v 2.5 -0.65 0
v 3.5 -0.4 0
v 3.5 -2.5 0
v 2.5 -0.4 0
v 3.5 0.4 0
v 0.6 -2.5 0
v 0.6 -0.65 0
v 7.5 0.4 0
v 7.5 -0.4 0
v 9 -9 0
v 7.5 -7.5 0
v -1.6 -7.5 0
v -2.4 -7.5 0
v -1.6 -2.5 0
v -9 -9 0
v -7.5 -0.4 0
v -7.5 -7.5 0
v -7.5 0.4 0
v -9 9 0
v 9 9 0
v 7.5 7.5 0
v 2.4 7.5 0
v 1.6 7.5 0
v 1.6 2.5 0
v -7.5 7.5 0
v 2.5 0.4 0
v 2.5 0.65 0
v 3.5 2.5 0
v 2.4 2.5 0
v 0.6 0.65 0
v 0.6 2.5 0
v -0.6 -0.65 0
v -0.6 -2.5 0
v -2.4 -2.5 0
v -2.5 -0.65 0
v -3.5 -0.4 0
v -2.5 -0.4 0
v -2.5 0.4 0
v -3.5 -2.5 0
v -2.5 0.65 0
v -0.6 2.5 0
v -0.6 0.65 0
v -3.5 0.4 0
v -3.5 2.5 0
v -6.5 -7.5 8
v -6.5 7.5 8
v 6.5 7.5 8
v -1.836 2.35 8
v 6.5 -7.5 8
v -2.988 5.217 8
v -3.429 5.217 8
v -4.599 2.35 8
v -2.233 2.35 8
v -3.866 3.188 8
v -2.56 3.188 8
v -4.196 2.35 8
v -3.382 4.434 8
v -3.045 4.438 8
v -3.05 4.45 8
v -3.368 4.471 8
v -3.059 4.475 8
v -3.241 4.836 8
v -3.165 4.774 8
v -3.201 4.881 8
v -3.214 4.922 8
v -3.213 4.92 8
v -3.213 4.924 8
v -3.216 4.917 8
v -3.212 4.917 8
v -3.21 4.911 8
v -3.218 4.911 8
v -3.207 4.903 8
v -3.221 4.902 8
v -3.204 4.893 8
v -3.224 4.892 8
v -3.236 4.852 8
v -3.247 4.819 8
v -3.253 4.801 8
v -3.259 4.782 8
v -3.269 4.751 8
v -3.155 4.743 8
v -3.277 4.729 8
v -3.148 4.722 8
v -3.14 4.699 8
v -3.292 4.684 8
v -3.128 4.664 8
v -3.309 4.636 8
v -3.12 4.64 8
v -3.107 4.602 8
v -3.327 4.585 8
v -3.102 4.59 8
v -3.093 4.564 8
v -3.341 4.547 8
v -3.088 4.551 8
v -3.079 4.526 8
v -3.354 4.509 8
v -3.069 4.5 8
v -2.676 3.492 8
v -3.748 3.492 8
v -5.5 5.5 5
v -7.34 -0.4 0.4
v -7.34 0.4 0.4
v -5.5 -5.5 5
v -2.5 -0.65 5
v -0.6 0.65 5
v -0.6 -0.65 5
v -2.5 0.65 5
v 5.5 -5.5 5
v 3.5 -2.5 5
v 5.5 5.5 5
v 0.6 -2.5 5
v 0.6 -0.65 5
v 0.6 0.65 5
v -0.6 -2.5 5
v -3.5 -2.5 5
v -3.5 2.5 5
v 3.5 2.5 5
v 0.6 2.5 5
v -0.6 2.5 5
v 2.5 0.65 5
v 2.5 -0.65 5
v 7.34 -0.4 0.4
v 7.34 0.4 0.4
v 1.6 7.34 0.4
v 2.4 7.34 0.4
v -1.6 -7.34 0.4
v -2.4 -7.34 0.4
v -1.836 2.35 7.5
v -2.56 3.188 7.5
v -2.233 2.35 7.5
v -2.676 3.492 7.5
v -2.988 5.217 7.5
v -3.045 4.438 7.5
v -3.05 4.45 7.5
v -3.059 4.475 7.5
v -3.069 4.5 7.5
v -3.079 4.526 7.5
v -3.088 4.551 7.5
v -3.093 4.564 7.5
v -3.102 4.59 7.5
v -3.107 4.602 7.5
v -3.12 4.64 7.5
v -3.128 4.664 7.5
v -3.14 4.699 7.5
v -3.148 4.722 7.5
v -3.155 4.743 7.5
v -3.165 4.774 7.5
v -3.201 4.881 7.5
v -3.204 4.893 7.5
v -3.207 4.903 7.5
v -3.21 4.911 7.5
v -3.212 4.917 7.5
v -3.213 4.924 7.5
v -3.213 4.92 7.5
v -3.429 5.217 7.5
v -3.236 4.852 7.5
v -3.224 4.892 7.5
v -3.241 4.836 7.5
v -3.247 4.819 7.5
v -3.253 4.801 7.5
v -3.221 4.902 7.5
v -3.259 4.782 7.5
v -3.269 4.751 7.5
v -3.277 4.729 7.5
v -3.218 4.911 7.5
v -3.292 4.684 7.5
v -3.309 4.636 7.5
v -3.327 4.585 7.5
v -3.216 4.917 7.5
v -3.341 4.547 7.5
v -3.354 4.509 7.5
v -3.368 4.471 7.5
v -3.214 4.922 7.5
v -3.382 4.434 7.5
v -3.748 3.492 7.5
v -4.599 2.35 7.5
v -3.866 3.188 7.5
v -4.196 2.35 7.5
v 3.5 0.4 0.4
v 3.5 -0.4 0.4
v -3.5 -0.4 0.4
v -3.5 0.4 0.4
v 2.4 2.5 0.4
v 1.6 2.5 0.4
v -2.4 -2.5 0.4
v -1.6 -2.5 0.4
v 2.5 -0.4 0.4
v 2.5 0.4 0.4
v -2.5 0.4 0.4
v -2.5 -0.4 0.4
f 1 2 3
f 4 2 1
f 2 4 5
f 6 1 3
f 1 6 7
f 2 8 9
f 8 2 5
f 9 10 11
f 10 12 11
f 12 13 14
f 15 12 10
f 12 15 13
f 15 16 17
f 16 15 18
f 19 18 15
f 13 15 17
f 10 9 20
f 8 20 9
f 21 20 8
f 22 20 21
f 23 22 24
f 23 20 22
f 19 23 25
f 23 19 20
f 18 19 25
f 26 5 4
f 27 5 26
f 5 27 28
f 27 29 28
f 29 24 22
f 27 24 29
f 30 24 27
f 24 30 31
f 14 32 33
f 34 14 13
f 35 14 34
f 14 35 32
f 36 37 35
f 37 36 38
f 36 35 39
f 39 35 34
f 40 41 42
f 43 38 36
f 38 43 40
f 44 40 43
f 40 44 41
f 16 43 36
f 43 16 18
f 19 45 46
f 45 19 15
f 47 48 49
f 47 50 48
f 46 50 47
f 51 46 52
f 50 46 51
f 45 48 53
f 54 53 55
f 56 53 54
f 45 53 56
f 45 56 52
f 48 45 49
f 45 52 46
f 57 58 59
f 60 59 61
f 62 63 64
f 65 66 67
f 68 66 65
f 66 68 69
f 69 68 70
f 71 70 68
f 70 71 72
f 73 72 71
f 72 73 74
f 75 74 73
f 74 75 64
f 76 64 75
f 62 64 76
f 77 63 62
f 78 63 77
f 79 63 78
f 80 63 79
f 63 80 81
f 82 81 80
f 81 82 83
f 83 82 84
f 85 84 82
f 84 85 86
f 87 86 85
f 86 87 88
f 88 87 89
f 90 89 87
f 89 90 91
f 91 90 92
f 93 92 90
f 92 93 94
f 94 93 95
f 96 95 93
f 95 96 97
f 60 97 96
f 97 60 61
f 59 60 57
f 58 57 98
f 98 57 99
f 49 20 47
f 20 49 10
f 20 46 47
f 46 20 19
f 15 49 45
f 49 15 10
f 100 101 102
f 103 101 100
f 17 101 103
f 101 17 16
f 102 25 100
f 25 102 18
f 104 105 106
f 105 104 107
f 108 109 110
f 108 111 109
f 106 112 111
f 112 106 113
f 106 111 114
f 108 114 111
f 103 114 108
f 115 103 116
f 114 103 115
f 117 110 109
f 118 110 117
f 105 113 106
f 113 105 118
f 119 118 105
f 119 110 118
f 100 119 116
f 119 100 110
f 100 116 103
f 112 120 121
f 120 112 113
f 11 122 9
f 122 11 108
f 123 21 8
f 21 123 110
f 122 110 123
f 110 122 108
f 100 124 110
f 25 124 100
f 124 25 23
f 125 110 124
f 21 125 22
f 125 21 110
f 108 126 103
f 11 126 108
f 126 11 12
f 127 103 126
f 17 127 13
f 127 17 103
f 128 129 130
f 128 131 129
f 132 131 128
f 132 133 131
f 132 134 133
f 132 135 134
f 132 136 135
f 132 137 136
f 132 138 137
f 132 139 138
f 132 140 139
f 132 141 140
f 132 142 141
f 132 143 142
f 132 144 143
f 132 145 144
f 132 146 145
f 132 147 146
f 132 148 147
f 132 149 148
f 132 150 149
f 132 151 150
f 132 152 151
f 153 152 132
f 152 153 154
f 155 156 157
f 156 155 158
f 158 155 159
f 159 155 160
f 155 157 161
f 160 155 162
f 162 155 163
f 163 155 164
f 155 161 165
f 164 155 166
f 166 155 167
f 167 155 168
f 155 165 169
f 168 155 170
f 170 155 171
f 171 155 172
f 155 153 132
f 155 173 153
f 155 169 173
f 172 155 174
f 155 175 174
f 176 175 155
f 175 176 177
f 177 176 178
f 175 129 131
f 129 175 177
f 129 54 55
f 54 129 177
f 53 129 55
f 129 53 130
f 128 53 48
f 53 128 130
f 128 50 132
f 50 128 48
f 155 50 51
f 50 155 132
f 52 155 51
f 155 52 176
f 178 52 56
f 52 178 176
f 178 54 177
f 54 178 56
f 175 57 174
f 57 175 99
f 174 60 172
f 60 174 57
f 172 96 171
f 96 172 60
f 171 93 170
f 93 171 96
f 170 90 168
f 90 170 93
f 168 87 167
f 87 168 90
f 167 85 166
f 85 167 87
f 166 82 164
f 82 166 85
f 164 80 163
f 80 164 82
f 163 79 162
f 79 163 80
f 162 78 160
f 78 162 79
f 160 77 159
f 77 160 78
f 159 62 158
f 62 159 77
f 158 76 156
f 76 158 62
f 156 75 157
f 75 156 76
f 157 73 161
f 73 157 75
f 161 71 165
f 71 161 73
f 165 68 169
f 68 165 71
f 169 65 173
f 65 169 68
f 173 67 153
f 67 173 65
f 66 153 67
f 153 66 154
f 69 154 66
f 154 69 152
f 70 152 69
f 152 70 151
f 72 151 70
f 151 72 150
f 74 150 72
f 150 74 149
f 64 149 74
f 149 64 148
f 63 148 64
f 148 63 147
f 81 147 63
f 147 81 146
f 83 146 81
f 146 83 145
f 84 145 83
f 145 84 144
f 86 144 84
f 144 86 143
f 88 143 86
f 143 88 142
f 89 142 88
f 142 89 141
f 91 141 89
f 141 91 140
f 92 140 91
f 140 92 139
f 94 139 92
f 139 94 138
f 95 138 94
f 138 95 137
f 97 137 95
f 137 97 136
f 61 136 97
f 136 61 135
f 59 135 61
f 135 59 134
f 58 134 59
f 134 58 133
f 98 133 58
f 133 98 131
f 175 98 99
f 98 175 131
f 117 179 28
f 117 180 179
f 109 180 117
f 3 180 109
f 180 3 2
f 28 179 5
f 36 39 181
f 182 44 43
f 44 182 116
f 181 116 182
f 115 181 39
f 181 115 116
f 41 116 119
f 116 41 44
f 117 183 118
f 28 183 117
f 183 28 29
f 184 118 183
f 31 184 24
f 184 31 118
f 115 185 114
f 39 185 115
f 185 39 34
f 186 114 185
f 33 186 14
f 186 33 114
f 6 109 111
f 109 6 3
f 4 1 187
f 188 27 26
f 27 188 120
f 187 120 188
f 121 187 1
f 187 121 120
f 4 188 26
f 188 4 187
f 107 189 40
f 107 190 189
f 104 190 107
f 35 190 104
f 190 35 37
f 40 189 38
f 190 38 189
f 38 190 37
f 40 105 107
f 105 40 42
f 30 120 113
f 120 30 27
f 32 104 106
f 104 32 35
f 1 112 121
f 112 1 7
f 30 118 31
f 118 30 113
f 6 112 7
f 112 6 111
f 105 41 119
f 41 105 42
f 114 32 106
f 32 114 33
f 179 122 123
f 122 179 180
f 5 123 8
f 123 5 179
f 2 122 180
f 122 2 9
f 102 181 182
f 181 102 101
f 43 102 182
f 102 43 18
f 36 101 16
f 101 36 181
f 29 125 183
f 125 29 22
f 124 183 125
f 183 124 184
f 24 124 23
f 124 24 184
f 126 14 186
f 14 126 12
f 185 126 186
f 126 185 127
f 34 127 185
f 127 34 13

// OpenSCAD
key_height = 8;
bottom_size = 18;
top_x_size = 13;
top_y_size = 15;

union() {
  difference() {
    linear_extrude(height = key_height, scale = [top_x_size / bottom_size, top_y_size / bottom_size]) {
      square(size=bottom_size, center=true);
    }
    linear_extrude(height = 5, scale = [11/(bottom_size-3), 11/(bottom_size-3)]) {
      square(size=bottom_size-3, center=true);
    }
    translate([-top_x_size/4, top_y_size/4, key_height-0.5]) linear_extrude(height = 1) text("A", font="Helvetica:style=Negreta", size=3, halign="center", valign="center", $fn=100);
  }
  translate([0, 0, 3]) {
    difference() {
      cube([7, 5, 6], center=true);
      cube([5, 1.3, 12], center=true);
      cube([1.2, 6, 12], center=true);
    }
  }
  translate([(18-7)/2, 0, 0.2]) cube([(18-6)/2, 0.8, 0.4], center=true);
  translate([-(18-7)/2, 0, 0.2]) cube([(18-6)/2, 0.8, 0.4], center=true);
  translate([2, (18-7)/2, 0.2]) cube([0.8, (18-5)/2, 0.4], center=true);
  translate([-2, -(18-7)/2, 0.2]) cube([0.8, (18-5)/2, 0.4], center=true);
}
